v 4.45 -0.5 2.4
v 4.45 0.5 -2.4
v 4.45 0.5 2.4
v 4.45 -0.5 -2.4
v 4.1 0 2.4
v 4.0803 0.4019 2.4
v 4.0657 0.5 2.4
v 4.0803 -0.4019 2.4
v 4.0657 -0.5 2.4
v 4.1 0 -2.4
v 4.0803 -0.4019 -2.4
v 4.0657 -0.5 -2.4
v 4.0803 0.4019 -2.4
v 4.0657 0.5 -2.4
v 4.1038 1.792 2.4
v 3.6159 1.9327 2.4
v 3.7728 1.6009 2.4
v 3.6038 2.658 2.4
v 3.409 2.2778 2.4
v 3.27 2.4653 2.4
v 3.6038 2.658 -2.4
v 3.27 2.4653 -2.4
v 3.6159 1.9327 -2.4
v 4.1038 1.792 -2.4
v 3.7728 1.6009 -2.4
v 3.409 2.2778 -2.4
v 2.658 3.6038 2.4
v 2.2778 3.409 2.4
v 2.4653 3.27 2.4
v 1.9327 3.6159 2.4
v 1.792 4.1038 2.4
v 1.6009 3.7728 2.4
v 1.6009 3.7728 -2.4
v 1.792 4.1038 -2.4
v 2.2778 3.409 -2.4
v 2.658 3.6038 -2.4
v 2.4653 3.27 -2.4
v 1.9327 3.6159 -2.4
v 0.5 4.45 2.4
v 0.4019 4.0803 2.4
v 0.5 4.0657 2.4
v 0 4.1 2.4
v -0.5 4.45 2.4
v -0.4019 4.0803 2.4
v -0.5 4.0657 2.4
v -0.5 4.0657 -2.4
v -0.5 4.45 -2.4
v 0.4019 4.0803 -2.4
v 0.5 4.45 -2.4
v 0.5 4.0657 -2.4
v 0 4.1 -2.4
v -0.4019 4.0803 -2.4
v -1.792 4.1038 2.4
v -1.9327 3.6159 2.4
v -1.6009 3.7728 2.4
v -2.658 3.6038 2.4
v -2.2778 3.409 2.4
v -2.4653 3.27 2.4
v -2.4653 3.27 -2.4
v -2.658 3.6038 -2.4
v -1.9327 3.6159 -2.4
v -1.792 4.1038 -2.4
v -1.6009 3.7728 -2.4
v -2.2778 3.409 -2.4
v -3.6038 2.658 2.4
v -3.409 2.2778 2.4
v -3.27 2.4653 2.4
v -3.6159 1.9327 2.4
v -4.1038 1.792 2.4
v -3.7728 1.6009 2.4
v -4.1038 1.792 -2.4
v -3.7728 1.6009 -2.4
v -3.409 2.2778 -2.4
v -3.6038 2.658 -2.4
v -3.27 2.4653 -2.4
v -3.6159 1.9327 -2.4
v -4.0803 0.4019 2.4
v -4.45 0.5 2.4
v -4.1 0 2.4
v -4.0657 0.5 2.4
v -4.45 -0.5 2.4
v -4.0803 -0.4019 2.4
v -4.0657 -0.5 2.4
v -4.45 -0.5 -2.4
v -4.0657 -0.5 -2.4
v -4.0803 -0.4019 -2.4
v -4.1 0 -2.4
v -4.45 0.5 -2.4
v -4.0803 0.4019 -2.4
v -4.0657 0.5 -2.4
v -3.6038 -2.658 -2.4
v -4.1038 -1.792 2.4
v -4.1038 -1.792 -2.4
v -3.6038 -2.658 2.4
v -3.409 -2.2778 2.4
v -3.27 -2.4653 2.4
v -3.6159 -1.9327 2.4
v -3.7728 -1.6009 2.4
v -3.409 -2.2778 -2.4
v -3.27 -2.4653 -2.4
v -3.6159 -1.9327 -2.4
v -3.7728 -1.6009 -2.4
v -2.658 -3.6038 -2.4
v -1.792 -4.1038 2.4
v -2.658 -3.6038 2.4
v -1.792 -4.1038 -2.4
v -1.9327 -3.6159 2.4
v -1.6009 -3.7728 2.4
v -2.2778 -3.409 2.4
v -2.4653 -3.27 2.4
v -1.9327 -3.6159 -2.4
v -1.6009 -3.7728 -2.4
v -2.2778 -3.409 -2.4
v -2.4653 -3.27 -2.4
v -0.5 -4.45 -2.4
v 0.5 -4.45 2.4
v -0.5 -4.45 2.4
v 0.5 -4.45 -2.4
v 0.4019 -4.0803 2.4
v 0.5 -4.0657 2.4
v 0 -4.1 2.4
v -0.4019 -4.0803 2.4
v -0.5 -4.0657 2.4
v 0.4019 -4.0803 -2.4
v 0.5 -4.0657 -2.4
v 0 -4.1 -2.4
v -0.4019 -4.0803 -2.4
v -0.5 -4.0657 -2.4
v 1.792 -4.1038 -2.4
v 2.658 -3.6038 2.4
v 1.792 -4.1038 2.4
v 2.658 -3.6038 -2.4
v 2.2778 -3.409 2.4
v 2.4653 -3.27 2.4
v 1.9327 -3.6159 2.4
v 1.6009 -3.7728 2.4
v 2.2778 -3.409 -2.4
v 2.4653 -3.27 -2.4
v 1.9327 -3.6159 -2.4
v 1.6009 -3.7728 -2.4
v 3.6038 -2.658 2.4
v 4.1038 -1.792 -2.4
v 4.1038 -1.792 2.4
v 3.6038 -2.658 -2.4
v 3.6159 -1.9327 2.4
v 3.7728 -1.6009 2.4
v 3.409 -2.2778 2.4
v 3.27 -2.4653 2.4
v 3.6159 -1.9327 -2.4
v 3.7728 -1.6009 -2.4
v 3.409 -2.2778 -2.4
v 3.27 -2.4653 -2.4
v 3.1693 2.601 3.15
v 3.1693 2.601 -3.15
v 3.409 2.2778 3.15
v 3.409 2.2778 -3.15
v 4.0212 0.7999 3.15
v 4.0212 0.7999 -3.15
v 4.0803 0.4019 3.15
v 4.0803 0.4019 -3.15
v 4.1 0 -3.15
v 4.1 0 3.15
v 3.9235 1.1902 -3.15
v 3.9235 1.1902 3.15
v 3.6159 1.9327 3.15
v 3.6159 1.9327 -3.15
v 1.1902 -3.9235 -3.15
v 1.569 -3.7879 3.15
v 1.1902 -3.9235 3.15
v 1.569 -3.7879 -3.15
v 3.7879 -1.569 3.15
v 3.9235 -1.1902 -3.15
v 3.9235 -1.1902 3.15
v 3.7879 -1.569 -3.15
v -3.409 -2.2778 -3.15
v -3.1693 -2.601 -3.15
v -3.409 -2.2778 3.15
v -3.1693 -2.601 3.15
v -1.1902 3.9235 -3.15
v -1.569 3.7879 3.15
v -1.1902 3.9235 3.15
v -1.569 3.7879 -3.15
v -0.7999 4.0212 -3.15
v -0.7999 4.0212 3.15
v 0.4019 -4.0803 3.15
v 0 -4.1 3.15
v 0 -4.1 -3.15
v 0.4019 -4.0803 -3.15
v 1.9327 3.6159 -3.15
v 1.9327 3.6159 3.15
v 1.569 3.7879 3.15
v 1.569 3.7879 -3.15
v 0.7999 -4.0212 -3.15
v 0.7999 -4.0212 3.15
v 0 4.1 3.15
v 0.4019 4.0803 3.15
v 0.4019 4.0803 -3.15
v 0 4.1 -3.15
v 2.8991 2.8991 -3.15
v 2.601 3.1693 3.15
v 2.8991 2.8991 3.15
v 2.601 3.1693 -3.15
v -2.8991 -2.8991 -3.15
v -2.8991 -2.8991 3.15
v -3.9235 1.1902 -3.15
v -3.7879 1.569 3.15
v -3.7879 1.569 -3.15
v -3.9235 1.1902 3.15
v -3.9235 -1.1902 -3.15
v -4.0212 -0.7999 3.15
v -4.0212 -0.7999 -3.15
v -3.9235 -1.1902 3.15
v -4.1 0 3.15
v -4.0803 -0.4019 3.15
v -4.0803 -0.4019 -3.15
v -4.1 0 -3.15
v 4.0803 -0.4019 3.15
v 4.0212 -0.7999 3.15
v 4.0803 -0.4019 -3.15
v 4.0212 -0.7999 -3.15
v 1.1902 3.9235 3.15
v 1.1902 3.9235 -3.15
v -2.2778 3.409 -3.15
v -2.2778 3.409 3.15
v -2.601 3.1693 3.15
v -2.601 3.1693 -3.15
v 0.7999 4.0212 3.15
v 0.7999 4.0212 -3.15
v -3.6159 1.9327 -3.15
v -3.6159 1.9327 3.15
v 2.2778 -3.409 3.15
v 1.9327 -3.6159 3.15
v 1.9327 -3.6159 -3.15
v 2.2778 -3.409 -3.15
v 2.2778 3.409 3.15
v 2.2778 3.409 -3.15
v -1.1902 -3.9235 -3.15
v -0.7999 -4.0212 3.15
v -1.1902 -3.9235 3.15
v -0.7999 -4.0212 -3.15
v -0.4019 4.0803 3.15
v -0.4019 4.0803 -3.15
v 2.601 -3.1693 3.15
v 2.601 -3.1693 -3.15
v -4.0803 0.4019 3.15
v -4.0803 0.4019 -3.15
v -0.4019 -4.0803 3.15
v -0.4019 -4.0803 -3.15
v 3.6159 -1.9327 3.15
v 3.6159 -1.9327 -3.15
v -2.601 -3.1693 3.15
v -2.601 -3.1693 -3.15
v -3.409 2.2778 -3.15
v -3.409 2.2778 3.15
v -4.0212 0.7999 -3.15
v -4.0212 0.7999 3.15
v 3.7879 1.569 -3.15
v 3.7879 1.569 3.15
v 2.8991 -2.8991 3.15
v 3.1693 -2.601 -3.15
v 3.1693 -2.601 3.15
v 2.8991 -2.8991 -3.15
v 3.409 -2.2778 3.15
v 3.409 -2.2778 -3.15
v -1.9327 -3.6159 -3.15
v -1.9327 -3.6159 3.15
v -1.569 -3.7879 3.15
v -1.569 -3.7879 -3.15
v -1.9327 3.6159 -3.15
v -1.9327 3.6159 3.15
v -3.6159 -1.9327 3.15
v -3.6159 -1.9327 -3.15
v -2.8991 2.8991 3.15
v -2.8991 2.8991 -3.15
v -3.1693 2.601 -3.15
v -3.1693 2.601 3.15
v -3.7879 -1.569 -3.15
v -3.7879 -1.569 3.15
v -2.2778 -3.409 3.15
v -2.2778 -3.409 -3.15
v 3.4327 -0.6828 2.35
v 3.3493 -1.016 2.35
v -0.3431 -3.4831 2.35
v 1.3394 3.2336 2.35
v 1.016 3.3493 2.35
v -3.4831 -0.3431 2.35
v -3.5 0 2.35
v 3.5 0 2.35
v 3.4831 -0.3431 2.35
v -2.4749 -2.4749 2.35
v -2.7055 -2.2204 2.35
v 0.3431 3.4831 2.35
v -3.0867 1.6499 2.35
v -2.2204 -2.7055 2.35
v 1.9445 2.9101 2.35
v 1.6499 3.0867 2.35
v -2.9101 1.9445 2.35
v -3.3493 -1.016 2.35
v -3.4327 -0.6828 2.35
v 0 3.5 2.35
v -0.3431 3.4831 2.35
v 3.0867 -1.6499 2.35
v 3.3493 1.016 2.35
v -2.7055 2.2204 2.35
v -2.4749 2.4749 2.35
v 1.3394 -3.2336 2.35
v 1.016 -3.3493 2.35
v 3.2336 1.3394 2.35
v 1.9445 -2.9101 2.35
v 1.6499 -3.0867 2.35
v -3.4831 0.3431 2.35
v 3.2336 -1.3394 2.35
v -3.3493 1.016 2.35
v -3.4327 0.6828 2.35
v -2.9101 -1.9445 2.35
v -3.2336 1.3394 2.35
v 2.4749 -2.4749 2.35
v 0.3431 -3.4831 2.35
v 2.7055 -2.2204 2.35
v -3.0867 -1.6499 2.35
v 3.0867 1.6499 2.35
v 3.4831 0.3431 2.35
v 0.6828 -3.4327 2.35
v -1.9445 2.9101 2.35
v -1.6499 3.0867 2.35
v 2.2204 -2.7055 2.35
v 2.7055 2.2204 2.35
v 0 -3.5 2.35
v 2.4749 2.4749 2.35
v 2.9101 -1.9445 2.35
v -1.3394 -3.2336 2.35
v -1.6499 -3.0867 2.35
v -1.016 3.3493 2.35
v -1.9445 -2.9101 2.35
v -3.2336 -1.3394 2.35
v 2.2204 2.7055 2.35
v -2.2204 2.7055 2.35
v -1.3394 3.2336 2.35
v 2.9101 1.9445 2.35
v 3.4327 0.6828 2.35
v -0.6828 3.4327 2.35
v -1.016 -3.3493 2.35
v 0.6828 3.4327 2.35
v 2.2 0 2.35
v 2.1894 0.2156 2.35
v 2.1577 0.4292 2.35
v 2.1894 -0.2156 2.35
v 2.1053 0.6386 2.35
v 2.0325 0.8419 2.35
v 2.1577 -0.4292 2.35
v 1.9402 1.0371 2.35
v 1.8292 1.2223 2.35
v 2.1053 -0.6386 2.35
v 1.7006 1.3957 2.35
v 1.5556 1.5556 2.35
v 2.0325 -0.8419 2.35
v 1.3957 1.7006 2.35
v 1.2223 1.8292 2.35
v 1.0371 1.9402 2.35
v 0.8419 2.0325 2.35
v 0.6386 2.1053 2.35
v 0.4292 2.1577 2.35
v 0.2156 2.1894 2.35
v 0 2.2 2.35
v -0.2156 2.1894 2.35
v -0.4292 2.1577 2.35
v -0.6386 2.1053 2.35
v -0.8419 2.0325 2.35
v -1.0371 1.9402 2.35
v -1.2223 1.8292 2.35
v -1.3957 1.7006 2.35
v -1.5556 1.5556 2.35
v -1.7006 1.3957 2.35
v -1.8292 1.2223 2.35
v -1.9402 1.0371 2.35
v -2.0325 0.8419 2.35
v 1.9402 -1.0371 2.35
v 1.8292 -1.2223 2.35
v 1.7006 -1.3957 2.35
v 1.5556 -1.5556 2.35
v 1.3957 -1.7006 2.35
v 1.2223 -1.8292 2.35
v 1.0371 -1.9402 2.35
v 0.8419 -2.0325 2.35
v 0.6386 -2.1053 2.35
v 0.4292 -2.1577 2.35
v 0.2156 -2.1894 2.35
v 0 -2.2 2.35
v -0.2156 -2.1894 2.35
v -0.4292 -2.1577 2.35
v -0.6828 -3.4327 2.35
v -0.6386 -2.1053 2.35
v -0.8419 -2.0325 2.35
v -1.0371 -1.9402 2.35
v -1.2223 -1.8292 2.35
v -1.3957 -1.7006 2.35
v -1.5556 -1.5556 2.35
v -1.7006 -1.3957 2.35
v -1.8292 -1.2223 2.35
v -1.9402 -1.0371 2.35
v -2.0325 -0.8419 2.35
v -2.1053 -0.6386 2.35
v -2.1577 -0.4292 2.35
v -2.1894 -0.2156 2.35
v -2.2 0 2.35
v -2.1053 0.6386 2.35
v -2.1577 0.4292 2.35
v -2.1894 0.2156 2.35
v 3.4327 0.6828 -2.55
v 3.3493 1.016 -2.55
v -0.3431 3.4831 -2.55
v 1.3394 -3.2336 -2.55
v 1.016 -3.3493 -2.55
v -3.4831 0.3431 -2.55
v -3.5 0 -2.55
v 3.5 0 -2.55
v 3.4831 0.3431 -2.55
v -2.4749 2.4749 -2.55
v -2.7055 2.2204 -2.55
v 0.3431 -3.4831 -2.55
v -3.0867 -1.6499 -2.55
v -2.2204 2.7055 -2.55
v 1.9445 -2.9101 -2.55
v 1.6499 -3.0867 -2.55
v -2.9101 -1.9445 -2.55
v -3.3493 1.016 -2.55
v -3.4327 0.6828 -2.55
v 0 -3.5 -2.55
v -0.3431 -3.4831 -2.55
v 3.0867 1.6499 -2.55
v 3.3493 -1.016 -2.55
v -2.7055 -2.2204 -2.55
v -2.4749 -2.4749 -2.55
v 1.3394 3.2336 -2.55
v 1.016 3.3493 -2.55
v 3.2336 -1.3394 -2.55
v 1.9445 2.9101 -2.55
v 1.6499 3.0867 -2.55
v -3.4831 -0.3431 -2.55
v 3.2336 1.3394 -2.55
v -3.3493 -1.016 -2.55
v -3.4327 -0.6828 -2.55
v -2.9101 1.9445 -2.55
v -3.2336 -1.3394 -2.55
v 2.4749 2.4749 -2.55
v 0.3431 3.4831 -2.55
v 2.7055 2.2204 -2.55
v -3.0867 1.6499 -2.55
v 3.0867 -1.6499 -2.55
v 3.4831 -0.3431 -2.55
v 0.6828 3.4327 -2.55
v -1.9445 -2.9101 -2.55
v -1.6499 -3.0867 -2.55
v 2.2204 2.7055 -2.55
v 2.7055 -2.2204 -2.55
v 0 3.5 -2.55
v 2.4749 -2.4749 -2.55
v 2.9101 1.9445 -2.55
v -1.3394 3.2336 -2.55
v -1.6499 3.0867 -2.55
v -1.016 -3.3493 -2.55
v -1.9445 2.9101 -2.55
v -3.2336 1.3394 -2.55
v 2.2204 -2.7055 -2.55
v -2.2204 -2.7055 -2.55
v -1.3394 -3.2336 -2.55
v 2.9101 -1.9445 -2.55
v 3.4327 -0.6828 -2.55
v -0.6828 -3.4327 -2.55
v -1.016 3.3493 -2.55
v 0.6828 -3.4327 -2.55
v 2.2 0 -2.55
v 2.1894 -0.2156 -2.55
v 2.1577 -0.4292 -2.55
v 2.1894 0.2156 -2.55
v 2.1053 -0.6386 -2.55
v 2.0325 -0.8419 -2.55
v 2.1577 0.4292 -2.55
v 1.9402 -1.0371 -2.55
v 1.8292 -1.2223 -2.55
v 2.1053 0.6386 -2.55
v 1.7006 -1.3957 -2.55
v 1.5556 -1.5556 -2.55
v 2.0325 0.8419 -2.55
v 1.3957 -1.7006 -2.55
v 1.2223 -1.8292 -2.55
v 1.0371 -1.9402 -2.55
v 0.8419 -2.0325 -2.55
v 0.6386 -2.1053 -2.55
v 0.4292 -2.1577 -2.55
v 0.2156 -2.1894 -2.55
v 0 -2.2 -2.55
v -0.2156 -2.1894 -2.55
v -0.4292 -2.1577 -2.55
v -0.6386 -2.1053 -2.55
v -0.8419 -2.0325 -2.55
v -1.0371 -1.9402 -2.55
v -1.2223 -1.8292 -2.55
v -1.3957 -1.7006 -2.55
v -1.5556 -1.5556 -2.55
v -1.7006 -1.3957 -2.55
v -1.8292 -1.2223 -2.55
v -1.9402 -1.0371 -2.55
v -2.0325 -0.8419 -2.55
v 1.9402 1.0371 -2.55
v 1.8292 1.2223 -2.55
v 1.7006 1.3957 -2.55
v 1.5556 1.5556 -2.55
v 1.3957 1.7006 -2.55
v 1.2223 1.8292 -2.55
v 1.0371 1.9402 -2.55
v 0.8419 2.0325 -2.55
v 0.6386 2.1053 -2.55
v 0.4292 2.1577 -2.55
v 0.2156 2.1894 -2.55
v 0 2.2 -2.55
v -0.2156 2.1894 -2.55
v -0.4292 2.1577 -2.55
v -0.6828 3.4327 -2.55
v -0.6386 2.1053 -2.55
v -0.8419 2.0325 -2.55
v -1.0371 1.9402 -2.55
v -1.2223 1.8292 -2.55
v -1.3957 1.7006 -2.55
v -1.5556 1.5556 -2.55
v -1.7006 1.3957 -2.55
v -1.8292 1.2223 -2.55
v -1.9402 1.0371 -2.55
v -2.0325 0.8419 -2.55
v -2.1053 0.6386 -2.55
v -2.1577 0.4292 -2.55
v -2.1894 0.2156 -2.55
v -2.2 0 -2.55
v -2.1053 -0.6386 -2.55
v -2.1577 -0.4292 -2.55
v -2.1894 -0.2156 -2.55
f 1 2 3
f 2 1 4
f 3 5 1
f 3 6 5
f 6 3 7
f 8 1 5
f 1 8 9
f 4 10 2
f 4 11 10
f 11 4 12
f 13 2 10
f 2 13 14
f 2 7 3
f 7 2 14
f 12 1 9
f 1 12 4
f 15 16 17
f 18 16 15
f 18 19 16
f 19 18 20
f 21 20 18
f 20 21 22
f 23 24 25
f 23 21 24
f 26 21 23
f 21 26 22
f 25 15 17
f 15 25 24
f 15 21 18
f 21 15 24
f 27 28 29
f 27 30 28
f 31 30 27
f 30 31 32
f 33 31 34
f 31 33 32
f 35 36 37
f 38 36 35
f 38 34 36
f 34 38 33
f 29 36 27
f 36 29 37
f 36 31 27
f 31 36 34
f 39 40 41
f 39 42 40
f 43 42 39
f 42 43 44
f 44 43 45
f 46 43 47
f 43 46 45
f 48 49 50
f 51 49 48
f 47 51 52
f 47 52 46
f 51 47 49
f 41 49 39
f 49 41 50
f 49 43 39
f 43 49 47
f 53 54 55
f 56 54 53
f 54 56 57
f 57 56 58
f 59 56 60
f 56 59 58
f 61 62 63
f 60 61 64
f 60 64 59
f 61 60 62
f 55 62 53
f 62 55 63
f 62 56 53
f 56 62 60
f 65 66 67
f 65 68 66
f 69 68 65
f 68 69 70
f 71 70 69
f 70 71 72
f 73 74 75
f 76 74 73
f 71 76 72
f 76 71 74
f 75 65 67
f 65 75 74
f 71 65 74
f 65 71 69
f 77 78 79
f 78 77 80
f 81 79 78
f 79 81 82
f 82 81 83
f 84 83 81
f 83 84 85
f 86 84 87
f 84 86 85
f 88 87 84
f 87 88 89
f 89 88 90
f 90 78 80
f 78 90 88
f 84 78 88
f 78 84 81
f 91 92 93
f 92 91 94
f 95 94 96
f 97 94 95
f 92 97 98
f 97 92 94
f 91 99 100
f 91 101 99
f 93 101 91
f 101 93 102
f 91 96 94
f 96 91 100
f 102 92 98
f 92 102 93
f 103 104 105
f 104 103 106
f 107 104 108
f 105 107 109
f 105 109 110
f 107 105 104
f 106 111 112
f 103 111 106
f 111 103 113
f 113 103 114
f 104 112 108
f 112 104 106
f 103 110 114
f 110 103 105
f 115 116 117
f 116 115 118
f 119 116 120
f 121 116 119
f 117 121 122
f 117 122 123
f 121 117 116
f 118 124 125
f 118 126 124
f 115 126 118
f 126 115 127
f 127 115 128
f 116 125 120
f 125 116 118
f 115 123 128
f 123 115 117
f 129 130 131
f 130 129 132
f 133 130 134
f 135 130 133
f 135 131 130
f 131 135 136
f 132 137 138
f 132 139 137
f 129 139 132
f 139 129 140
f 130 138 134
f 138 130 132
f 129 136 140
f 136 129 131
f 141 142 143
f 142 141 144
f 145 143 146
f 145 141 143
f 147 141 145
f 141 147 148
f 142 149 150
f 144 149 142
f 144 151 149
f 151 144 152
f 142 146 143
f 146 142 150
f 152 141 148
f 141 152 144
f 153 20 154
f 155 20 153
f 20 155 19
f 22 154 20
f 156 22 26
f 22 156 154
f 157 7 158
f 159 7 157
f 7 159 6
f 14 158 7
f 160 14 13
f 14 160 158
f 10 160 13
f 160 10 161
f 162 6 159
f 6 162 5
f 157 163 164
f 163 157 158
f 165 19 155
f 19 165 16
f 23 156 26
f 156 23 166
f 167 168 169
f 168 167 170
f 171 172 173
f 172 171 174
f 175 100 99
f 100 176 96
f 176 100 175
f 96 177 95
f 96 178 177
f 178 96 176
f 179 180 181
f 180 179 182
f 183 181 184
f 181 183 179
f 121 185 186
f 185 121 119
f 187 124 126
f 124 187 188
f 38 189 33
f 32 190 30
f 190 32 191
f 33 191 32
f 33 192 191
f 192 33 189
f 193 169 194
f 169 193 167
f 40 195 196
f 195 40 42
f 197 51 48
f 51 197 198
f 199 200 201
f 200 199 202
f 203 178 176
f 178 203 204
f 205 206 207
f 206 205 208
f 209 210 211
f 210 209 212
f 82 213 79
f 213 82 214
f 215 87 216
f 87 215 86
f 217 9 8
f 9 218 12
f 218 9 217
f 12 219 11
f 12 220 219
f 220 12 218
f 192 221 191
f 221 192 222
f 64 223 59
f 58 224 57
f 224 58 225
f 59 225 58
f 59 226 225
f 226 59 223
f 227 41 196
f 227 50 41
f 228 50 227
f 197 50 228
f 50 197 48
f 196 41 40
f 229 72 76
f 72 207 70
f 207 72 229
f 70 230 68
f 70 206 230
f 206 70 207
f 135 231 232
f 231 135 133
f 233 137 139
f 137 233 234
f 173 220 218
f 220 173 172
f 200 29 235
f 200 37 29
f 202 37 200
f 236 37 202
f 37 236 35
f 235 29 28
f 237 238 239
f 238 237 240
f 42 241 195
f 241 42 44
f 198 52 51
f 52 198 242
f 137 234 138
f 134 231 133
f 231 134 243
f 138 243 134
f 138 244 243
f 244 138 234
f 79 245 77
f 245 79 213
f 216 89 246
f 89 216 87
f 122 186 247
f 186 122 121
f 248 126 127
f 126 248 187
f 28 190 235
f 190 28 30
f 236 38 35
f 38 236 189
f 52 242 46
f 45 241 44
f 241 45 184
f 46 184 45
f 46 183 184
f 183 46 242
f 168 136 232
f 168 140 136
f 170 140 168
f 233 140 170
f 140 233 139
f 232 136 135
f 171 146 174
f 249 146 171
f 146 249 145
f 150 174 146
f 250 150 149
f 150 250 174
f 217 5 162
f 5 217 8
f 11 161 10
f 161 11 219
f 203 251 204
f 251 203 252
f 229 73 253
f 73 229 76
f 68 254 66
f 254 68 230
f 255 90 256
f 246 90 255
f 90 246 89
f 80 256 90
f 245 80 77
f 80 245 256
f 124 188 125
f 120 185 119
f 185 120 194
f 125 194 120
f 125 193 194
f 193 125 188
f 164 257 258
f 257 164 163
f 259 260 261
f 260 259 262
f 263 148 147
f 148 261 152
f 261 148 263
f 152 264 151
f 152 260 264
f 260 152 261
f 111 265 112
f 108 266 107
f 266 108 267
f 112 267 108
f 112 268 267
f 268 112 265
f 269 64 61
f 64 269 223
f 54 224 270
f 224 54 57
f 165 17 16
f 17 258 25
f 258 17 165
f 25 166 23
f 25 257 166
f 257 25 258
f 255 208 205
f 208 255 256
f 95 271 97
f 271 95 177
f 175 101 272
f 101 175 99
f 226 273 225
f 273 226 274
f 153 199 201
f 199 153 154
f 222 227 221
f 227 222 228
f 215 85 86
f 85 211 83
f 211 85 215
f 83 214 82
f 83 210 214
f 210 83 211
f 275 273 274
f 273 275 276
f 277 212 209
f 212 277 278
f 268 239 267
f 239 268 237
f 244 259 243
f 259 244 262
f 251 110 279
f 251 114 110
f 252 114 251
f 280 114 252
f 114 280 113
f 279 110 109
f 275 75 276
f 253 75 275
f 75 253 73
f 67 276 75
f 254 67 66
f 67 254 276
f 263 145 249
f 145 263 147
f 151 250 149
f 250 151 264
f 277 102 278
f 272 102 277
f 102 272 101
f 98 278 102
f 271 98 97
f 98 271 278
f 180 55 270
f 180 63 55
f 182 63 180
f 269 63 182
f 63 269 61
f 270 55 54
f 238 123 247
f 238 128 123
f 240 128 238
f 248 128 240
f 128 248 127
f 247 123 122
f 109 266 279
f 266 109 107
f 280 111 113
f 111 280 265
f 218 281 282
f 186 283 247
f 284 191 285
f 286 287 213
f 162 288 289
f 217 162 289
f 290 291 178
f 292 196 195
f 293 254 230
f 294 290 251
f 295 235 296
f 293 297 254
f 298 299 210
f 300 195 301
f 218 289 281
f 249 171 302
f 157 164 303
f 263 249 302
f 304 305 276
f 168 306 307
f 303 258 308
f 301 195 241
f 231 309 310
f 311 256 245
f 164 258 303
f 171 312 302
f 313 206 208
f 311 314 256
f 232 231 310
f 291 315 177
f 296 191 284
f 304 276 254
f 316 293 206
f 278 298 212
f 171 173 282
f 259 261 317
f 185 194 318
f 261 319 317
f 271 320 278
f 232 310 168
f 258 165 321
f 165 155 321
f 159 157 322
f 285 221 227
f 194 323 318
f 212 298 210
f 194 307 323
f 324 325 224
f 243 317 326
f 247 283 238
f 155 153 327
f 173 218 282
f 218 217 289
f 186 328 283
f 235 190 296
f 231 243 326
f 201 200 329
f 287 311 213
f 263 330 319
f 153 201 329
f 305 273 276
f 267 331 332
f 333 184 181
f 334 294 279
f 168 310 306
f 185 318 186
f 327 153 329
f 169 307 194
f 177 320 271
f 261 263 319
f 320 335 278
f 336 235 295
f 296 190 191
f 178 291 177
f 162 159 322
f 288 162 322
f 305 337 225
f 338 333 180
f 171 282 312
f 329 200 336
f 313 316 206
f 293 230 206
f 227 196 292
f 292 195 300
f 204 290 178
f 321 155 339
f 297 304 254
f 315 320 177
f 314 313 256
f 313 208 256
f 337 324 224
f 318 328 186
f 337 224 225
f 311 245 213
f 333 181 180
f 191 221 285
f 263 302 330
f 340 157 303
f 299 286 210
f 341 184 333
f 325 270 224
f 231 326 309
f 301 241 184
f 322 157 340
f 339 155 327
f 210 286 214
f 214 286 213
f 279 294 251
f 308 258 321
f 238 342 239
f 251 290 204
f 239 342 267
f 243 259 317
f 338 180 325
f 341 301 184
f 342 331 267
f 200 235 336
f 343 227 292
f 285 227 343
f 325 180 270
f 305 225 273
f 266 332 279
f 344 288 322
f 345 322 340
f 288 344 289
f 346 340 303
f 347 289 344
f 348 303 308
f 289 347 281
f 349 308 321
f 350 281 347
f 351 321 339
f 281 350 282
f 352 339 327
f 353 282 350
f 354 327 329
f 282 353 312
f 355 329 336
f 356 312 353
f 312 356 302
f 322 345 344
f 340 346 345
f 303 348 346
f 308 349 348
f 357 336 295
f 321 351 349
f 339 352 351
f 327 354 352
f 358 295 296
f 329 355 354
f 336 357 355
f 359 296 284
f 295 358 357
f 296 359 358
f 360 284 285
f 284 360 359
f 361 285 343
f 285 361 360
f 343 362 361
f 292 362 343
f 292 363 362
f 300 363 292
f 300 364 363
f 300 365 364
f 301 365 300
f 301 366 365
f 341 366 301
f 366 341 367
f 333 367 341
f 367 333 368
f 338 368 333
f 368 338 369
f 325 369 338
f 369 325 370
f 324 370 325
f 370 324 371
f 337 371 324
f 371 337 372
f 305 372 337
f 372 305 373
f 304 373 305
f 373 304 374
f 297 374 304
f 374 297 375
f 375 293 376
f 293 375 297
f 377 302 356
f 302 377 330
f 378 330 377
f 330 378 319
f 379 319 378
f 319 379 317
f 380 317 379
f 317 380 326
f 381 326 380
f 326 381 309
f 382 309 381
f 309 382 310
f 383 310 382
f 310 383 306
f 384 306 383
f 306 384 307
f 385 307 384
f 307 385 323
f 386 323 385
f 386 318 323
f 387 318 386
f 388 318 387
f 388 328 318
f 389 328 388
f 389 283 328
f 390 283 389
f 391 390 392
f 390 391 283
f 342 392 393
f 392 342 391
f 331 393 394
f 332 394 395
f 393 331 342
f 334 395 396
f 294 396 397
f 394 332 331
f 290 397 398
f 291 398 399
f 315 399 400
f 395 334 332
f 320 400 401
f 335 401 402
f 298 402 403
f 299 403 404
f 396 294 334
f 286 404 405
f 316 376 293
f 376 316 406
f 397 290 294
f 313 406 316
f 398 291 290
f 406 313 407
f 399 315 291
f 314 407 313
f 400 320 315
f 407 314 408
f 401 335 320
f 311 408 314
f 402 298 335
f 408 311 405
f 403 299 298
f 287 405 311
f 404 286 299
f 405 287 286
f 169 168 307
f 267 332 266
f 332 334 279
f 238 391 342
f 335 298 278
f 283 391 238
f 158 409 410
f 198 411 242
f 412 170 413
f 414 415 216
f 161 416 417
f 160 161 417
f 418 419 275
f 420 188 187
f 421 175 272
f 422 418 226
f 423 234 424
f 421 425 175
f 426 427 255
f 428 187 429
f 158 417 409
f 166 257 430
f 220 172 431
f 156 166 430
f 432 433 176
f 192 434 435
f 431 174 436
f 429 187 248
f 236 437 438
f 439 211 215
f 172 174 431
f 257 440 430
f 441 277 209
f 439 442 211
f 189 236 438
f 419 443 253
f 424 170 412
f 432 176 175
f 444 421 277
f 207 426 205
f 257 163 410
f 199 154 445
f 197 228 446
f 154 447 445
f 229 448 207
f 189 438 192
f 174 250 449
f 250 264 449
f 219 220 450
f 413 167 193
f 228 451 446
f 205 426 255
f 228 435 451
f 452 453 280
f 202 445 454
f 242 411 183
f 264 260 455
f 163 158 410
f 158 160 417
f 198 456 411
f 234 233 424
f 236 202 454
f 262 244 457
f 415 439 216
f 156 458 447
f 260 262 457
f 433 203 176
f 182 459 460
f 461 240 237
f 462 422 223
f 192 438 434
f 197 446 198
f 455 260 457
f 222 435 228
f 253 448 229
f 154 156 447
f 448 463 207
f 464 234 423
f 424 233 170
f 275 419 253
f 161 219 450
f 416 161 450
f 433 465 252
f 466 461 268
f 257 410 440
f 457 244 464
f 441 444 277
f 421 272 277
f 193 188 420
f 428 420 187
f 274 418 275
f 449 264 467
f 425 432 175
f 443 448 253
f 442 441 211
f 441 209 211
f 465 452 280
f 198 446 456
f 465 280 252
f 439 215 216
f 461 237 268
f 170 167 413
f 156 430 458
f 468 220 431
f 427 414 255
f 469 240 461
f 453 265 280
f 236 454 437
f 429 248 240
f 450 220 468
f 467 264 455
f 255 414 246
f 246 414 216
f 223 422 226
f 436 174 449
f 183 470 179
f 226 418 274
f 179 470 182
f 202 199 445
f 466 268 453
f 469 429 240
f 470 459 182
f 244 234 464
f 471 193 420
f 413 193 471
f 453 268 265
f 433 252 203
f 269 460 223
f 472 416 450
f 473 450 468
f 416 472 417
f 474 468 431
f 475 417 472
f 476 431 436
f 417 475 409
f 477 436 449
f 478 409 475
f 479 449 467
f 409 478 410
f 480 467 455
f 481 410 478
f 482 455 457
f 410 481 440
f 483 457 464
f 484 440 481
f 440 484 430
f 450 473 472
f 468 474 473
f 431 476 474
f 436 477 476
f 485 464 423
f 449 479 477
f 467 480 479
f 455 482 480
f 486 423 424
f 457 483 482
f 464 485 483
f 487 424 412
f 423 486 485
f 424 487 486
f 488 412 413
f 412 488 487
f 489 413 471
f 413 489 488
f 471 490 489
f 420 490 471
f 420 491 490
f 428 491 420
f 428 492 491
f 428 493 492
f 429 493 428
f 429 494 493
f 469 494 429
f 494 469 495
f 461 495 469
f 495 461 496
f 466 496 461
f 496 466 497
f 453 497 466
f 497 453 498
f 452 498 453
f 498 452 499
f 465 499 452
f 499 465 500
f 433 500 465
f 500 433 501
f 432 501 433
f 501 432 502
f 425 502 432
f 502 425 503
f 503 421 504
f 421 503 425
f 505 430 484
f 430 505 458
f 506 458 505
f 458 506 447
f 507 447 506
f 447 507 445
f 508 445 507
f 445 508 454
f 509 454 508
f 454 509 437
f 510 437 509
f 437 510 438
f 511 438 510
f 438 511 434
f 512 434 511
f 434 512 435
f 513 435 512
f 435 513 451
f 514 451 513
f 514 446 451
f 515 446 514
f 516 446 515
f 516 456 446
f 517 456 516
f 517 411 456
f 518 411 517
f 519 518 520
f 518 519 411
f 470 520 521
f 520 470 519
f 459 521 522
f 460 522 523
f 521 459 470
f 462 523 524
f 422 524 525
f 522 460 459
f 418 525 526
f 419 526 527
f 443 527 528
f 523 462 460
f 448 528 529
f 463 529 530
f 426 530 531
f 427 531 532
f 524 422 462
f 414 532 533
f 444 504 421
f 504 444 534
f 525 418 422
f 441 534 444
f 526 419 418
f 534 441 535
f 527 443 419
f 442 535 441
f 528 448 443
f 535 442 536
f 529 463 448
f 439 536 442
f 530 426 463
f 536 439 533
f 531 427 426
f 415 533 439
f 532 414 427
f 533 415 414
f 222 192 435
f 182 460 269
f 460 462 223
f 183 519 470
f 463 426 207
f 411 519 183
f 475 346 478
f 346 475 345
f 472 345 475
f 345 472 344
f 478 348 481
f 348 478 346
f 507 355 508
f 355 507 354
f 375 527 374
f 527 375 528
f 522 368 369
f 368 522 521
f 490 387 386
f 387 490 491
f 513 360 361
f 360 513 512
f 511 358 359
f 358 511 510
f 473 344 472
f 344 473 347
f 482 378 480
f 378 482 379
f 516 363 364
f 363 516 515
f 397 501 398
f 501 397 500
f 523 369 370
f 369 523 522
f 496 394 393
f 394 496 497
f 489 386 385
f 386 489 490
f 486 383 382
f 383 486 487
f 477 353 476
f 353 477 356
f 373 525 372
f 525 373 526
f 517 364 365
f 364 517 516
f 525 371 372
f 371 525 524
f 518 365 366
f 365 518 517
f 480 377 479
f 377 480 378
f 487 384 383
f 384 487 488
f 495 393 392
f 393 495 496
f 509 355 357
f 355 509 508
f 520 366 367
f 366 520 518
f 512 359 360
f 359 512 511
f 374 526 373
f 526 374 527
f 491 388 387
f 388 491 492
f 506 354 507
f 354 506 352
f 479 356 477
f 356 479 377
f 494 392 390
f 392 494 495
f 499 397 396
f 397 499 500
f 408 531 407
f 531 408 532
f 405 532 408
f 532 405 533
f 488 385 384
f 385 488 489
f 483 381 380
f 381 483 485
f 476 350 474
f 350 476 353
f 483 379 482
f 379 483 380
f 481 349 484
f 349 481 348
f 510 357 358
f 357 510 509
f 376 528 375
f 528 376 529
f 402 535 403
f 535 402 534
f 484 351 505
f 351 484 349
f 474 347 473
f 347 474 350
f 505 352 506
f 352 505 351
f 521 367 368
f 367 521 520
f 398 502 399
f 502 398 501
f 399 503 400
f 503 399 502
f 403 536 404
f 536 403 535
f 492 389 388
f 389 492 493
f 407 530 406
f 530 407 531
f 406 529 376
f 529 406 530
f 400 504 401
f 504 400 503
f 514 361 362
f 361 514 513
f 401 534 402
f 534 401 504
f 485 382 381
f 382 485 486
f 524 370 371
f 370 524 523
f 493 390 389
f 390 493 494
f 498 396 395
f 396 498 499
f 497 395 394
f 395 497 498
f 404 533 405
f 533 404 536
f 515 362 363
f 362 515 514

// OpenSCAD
// Parameters
screw_diameter = 4.0; //[2.0:8.0:0.1]
outer_diameter = 8.2; //[4.1:16.4:0.1]
length = 6.3; //[3.15:12.6:0.1]
inner_thread_diameter = 4.0; //[2.0:8.0:0.05]
inner_clearance = 0.4; //[0.1:1.0:0.05]
lead_in_chamfer_height = 0.8; //[0.4:1.6:0.05]
installation_end_chamfer_height = 0.6; //[0.3:1.2:0.05]
chamfer_radial_reduction = 0.6; //[0.3:1.2:0.05]
rib_count = 12; //[6:24:1]
rib_radial_height = 0.35; //[0.15:0.8:0.05]
rib_tangential_width = 1.0; //[0.5:2.0:0.05]
rib_axial_height = 4.8; //[2.4:9.6:0.1]
rib_overlap = 0.8; //[0.5:2.0:0.05]
rib_z_offset = 0.0; //[-1.0:1.0:0.05]

// Module for the heat-set insert
module insert() {
  color([0.8, 0.6, 0.2]) { // Brass color
    difference() {
      union() {
        // Main body
        cylinder(r=outer_diameter/2, h=length, center=true, $fn=64);
        
        // Ribs
        for (i = [0:rib_count-1]) {
          rotate([0, 0, i*360/rib_count])
          translate([outer_diameter/2 + (rib_radial_height + rib_overlap)/2 - rib_overlap, 0, rib_z_offset])
          cube([rib_radial_height + rib_overlap, rib_tangential_width, rib_axial_height], center=true);
        }
      }
      
      // Lead-in chamfer
      translate([0, 0, length/2 - lead_in_chamfer_height/2])
      rotate([180, 0, 0])
      cylinder(r1=outer_diameter/2, r2=outer_diameter/2 - chamfer_radial_reduction, h=lead_in_chamfer_height, center=true, $fn=64);
      
      // Installation end chamfer
      translate([0, 0, -length/2 + installation_end_chamfer_height/2])
      cylinder(r1=outer_diameter/2, r2=outer_diameter/2 - chamfer_radial_reduction, h=installation_end_chamfer_height, center=true, $fn=64);
    }
  }
}

// Module for the threaded insert
module threaded_insert() {
  color([0.8, 0.6, 0.2]) { // Brass color
    difference() {
      insert();
      
      // Internal thread (clearance hole)
      cylinder(r=(inner_thread_diameter + inner_clearance)/2, h=length + (lead_in_chamfer_height + installation_end_chamfer_height), center=true, $fn=64);
    }
  }
}

// Assembly of the insert
module assembly() {
  threaded_insert();
}

assembly();
